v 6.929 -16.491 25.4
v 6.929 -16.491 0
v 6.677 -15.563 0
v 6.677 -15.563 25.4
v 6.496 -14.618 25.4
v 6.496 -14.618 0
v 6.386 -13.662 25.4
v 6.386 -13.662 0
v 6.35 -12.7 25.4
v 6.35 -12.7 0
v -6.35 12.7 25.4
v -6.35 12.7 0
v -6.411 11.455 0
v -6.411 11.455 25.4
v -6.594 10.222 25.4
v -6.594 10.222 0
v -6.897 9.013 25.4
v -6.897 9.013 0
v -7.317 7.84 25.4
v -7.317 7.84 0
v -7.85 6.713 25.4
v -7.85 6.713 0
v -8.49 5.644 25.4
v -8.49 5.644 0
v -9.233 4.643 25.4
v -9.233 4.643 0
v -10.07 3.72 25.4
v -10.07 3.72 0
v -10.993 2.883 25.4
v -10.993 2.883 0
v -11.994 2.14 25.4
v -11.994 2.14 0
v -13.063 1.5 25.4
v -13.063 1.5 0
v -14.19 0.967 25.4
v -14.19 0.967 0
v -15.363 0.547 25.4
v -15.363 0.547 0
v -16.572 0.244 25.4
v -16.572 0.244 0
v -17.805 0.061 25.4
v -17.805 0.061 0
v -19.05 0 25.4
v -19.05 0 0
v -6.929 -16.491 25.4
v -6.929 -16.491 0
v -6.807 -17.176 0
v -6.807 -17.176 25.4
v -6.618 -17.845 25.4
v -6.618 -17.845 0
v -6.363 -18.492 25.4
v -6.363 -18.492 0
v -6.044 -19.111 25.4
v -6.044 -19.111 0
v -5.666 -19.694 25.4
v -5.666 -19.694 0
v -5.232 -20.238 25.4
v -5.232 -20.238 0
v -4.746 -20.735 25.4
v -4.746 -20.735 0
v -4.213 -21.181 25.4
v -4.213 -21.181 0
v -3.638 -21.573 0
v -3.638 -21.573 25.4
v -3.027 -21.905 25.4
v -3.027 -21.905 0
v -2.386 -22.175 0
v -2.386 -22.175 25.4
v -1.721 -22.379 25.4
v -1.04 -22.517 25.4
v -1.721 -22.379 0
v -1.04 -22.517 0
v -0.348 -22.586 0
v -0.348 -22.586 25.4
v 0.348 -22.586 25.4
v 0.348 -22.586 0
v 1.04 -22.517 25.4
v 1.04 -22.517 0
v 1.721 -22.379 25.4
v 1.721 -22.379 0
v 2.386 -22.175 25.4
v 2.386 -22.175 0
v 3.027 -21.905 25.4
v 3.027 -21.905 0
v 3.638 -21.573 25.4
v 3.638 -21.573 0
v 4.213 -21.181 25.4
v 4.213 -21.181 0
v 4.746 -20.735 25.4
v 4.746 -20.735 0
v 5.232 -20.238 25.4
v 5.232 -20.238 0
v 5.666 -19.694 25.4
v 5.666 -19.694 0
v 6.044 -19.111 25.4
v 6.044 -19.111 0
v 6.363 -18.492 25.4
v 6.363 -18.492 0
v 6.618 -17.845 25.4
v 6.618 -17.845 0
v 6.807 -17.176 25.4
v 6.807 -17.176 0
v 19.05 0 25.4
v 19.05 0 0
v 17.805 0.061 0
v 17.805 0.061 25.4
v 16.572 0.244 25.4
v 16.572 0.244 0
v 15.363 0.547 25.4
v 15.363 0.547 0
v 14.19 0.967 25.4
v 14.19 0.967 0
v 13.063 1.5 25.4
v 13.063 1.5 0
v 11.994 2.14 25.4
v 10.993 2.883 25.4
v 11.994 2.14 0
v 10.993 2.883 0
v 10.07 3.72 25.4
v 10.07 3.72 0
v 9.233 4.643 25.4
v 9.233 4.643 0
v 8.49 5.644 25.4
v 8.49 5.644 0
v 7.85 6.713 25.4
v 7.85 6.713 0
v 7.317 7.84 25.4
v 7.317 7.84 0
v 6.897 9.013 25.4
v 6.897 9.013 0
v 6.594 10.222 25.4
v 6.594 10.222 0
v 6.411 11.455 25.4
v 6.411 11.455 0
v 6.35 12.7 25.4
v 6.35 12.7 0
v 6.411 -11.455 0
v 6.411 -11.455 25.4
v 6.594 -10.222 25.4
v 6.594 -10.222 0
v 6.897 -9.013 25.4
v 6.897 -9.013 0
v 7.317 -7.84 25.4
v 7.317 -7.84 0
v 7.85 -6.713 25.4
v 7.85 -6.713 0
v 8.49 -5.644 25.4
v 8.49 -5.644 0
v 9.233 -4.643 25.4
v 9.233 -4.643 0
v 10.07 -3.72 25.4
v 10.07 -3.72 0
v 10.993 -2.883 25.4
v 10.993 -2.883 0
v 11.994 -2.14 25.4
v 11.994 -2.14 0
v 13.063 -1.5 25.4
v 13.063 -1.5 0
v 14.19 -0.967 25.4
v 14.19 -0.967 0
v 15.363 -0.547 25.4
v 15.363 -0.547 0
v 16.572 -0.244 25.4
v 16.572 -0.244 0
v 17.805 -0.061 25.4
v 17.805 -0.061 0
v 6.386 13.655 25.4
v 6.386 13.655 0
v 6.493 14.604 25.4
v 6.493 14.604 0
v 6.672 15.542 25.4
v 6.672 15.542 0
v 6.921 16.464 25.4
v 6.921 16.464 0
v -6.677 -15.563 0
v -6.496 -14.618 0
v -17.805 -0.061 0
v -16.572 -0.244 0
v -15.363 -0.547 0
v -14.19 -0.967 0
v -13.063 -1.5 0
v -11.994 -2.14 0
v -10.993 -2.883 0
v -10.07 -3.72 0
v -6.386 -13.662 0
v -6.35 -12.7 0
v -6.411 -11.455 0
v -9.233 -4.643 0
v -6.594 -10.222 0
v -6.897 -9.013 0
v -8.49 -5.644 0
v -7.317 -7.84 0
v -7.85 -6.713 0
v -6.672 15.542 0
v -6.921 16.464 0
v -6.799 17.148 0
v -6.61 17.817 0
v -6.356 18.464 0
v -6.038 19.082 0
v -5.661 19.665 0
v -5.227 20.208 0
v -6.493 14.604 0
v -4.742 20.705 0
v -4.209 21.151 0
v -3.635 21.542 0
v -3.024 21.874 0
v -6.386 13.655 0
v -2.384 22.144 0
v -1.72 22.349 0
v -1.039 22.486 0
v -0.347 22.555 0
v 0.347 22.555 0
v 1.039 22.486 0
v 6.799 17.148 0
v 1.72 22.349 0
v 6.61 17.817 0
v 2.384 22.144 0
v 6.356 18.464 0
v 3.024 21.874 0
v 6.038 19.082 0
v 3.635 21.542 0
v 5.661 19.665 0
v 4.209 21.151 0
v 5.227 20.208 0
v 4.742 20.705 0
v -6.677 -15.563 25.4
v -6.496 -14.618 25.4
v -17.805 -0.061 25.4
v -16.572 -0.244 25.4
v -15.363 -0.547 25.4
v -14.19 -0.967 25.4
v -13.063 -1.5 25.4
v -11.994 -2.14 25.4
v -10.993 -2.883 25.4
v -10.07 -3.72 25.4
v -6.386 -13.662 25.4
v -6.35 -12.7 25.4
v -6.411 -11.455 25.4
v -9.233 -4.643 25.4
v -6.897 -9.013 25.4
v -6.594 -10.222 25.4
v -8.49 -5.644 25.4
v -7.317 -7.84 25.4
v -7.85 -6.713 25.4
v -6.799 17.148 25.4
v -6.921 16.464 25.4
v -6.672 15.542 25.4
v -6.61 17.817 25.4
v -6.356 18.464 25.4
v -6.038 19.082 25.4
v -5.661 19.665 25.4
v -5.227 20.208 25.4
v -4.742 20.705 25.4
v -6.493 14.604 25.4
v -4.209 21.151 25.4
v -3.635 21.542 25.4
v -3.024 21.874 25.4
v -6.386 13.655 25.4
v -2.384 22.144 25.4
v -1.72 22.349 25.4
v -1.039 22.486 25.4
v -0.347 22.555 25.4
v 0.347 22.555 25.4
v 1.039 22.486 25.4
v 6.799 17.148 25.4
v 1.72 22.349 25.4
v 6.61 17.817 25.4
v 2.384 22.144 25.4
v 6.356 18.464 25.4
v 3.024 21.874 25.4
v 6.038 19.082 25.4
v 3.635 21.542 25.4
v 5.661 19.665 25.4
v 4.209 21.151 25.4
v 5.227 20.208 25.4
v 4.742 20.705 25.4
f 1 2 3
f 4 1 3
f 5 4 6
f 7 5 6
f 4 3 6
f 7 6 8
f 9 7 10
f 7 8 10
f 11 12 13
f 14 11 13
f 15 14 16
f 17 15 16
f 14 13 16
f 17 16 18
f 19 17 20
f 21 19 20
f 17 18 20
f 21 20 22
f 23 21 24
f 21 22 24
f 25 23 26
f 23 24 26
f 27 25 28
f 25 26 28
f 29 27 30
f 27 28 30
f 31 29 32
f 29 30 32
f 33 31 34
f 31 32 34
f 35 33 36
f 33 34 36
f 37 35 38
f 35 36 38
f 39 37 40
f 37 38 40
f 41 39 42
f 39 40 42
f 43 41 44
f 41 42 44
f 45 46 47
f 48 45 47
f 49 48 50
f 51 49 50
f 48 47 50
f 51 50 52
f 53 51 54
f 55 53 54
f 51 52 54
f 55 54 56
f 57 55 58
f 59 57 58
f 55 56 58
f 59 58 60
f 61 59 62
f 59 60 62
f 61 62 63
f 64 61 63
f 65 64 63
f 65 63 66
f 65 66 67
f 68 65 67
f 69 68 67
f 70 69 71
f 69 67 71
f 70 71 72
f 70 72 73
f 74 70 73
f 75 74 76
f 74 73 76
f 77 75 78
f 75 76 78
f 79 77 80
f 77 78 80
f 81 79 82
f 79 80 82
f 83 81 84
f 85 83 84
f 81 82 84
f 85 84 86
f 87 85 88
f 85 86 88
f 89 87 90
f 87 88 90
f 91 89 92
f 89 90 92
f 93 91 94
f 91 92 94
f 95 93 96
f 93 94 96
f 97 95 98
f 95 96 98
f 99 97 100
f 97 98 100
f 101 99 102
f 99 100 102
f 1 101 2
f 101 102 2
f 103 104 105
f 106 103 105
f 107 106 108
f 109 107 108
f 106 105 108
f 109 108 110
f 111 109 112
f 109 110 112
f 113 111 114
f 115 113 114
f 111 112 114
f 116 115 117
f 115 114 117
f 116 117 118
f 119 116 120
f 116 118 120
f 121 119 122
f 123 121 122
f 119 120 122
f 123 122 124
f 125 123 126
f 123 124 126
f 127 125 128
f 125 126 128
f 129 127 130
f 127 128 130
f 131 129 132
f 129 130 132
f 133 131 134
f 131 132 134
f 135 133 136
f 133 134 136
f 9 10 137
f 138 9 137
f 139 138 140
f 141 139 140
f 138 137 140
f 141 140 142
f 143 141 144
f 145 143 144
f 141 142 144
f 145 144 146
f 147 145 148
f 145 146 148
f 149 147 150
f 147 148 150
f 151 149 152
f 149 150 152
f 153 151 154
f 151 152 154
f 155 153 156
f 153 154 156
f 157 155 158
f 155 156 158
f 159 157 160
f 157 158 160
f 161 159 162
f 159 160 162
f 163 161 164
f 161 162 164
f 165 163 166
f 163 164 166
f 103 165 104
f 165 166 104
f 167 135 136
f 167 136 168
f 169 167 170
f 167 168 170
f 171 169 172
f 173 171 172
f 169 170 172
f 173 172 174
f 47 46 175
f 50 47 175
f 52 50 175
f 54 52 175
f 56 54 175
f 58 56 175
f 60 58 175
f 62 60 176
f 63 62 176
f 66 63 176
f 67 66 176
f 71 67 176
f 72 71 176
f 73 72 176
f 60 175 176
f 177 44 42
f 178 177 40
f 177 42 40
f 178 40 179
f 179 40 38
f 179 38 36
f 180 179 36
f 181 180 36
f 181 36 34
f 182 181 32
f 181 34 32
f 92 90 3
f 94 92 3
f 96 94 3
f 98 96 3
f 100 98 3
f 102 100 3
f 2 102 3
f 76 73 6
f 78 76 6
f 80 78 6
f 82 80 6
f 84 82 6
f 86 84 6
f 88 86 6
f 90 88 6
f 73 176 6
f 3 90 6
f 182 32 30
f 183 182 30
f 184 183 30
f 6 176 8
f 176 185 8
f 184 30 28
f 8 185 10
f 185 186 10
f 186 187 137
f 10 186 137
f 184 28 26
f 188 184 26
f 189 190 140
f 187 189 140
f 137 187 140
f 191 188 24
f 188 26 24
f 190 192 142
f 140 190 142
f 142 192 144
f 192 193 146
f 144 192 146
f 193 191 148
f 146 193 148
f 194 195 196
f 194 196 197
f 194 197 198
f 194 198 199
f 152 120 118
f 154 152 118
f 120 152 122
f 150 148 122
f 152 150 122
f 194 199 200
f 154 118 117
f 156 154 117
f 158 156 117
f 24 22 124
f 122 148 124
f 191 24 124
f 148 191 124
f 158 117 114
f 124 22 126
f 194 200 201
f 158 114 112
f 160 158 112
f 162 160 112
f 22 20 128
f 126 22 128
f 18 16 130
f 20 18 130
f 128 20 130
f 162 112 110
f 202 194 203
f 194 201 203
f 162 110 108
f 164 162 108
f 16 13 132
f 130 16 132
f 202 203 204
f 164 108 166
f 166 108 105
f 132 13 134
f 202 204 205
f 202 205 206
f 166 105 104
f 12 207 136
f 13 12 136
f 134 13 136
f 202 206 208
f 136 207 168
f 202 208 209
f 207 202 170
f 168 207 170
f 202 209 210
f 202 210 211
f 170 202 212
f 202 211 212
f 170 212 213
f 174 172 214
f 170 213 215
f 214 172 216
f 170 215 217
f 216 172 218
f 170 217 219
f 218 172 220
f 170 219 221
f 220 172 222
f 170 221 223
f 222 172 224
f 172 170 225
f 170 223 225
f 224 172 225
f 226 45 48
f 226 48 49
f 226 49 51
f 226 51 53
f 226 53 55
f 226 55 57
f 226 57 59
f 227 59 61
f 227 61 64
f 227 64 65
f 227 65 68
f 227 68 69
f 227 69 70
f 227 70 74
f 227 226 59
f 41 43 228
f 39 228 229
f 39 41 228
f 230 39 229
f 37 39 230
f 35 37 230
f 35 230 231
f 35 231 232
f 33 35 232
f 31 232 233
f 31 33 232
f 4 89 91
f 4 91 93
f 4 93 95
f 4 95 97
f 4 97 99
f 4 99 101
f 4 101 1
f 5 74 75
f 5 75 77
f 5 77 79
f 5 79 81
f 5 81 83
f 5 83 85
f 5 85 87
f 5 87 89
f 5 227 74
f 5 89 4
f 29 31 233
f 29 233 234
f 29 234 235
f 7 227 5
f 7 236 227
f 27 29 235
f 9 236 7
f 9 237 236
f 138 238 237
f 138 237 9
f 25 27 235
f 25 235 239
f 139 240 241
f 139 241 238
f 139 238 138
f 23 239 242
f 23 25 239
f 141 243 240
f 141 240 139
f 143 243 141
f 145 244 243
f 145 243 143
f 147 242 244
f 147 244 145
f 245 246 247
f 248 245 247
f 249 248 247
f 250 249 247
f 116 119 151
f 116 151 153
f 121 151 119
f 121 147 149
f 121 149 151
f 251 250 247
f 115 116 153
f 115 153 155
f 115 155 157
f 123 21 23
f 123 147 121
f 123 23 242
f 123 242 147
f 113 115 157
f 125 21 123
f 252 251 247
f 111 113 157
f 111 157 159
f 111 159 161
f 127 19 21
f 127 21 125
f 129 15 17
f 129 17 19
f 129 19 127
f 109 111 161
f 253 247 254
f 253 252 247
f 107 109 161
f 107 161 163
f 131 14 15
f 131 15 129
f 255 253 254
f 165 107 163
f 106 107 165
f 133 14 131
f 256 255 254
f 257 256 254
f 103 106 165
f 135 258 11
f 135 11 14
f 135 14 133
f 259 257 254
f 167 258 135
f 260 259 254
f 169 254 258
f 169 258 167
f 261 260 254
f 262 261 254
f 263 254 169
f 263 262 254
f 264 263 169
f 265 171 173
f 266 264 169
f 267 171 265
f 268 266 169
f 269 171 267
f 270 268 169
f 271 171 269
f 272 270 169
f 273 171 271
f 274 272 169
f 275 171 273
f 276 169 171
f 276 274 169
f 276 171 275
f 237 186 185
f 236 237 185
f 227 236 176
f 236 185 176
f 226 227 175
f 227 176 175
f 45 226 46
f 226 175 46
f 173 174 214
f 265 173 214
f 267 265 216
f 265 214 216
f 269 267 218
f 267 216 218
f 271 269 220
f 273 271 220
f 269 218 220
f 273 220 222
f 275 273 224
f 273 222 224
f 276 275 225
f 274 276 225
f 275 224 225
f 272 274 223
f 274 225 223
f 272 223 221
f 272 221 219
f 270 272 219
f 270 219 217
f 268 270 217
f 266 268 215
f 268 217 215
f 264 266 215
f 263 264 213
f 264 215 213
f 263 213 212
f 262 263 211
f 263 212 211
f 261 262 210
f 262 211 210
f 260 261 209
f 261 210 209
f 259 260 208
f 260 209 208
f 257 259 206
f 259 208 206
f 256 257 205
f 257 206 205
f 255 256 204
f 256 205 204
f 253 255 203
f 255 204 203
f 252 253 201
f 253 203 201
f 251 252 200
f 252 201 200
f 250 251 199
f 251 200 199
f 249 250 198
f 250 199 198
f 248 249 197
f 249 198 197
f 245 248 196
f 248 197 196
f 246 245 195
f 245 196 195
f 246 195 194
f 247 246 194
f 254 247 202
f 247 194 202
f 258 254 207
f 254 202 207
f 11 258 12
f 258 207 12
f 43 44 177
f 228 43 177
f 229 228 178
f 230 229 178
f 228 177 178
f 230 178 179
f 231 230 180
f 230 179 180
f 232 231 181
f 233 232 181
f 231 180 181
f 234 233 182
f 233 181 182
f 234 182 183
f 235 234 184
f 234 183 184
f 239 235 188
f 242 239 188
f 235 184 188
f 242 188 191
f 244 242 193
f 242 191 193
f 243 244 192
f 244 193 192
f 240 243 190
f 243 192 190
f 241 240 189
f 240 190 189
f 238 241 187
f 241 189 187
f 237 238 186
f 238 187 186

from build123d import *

# Parameters (mm, degrees)
F1_DEPTH = 25.4


# Not quite as in the source:
# - a feature names something its author has since deleted; it is built from what else it names


with BuildPart() as f1:
    # F0 (on Top) → F1 (new body)
    with BuildSketch(Plane.XY):
        with BuildLine():
            ThreePointArc((-6.920715507, 16.4643668374), (-6.4934894763, 14.6036920626), (-6.35, 12.7))
            Line((-6.35, 12.7), (6.35, 12.7))
            ThreePointArc((6.35, 12.7), (6.4934894763, 14.6036920626), (6.920715507, 16.4643668374))
            ThreePointArc((6.920715507, 16.4643668374), (0, 22.5641302142), (-6.920715507, 16.4643668374))
        make_face()
        with BuildLine():
            Line((6.35, 12.7), (-6.35, 12.7))
            ThreePointArc((-6.35, 12.7), (-10.0697438789, 3.7197438789), (-19.05, 0))
            ThreePointArc((-19.05, 0), (-10.0697438789, -3.7197438789), (-6.35, -12.7))
            Line((-6.35, -12.7), (6.35, -12.7))
            ThreePointArc((6.35, -12.7), (10.0697438789, -3.7197438789), (19.05, 0))
            ThreePointArc((19.05, 0), (10.0697438789, 3.7197438789), (6.35, 12.7))
        make_face()
        with BuildLine():
            Line((6.35, -12.7), (-6.35, -12.7))
            ThreePointArc((-6.35, -12.7), (-6.4956231596, -14.6177127391), (-6.9291530945, -16.4914469919))
            ThreePointArc((-6.9291530945, -16.4914469919), (0, -22.5949355663), (6.9291530945, -16.4914469919))
            ThreePointArc((6.9291530945, -16.4914469919), (6.4956231596, -14.6177127391), (6.35, -12.7))
        make_face()
    extrude(amount=F1_DEPTH)


solid = f1.part
